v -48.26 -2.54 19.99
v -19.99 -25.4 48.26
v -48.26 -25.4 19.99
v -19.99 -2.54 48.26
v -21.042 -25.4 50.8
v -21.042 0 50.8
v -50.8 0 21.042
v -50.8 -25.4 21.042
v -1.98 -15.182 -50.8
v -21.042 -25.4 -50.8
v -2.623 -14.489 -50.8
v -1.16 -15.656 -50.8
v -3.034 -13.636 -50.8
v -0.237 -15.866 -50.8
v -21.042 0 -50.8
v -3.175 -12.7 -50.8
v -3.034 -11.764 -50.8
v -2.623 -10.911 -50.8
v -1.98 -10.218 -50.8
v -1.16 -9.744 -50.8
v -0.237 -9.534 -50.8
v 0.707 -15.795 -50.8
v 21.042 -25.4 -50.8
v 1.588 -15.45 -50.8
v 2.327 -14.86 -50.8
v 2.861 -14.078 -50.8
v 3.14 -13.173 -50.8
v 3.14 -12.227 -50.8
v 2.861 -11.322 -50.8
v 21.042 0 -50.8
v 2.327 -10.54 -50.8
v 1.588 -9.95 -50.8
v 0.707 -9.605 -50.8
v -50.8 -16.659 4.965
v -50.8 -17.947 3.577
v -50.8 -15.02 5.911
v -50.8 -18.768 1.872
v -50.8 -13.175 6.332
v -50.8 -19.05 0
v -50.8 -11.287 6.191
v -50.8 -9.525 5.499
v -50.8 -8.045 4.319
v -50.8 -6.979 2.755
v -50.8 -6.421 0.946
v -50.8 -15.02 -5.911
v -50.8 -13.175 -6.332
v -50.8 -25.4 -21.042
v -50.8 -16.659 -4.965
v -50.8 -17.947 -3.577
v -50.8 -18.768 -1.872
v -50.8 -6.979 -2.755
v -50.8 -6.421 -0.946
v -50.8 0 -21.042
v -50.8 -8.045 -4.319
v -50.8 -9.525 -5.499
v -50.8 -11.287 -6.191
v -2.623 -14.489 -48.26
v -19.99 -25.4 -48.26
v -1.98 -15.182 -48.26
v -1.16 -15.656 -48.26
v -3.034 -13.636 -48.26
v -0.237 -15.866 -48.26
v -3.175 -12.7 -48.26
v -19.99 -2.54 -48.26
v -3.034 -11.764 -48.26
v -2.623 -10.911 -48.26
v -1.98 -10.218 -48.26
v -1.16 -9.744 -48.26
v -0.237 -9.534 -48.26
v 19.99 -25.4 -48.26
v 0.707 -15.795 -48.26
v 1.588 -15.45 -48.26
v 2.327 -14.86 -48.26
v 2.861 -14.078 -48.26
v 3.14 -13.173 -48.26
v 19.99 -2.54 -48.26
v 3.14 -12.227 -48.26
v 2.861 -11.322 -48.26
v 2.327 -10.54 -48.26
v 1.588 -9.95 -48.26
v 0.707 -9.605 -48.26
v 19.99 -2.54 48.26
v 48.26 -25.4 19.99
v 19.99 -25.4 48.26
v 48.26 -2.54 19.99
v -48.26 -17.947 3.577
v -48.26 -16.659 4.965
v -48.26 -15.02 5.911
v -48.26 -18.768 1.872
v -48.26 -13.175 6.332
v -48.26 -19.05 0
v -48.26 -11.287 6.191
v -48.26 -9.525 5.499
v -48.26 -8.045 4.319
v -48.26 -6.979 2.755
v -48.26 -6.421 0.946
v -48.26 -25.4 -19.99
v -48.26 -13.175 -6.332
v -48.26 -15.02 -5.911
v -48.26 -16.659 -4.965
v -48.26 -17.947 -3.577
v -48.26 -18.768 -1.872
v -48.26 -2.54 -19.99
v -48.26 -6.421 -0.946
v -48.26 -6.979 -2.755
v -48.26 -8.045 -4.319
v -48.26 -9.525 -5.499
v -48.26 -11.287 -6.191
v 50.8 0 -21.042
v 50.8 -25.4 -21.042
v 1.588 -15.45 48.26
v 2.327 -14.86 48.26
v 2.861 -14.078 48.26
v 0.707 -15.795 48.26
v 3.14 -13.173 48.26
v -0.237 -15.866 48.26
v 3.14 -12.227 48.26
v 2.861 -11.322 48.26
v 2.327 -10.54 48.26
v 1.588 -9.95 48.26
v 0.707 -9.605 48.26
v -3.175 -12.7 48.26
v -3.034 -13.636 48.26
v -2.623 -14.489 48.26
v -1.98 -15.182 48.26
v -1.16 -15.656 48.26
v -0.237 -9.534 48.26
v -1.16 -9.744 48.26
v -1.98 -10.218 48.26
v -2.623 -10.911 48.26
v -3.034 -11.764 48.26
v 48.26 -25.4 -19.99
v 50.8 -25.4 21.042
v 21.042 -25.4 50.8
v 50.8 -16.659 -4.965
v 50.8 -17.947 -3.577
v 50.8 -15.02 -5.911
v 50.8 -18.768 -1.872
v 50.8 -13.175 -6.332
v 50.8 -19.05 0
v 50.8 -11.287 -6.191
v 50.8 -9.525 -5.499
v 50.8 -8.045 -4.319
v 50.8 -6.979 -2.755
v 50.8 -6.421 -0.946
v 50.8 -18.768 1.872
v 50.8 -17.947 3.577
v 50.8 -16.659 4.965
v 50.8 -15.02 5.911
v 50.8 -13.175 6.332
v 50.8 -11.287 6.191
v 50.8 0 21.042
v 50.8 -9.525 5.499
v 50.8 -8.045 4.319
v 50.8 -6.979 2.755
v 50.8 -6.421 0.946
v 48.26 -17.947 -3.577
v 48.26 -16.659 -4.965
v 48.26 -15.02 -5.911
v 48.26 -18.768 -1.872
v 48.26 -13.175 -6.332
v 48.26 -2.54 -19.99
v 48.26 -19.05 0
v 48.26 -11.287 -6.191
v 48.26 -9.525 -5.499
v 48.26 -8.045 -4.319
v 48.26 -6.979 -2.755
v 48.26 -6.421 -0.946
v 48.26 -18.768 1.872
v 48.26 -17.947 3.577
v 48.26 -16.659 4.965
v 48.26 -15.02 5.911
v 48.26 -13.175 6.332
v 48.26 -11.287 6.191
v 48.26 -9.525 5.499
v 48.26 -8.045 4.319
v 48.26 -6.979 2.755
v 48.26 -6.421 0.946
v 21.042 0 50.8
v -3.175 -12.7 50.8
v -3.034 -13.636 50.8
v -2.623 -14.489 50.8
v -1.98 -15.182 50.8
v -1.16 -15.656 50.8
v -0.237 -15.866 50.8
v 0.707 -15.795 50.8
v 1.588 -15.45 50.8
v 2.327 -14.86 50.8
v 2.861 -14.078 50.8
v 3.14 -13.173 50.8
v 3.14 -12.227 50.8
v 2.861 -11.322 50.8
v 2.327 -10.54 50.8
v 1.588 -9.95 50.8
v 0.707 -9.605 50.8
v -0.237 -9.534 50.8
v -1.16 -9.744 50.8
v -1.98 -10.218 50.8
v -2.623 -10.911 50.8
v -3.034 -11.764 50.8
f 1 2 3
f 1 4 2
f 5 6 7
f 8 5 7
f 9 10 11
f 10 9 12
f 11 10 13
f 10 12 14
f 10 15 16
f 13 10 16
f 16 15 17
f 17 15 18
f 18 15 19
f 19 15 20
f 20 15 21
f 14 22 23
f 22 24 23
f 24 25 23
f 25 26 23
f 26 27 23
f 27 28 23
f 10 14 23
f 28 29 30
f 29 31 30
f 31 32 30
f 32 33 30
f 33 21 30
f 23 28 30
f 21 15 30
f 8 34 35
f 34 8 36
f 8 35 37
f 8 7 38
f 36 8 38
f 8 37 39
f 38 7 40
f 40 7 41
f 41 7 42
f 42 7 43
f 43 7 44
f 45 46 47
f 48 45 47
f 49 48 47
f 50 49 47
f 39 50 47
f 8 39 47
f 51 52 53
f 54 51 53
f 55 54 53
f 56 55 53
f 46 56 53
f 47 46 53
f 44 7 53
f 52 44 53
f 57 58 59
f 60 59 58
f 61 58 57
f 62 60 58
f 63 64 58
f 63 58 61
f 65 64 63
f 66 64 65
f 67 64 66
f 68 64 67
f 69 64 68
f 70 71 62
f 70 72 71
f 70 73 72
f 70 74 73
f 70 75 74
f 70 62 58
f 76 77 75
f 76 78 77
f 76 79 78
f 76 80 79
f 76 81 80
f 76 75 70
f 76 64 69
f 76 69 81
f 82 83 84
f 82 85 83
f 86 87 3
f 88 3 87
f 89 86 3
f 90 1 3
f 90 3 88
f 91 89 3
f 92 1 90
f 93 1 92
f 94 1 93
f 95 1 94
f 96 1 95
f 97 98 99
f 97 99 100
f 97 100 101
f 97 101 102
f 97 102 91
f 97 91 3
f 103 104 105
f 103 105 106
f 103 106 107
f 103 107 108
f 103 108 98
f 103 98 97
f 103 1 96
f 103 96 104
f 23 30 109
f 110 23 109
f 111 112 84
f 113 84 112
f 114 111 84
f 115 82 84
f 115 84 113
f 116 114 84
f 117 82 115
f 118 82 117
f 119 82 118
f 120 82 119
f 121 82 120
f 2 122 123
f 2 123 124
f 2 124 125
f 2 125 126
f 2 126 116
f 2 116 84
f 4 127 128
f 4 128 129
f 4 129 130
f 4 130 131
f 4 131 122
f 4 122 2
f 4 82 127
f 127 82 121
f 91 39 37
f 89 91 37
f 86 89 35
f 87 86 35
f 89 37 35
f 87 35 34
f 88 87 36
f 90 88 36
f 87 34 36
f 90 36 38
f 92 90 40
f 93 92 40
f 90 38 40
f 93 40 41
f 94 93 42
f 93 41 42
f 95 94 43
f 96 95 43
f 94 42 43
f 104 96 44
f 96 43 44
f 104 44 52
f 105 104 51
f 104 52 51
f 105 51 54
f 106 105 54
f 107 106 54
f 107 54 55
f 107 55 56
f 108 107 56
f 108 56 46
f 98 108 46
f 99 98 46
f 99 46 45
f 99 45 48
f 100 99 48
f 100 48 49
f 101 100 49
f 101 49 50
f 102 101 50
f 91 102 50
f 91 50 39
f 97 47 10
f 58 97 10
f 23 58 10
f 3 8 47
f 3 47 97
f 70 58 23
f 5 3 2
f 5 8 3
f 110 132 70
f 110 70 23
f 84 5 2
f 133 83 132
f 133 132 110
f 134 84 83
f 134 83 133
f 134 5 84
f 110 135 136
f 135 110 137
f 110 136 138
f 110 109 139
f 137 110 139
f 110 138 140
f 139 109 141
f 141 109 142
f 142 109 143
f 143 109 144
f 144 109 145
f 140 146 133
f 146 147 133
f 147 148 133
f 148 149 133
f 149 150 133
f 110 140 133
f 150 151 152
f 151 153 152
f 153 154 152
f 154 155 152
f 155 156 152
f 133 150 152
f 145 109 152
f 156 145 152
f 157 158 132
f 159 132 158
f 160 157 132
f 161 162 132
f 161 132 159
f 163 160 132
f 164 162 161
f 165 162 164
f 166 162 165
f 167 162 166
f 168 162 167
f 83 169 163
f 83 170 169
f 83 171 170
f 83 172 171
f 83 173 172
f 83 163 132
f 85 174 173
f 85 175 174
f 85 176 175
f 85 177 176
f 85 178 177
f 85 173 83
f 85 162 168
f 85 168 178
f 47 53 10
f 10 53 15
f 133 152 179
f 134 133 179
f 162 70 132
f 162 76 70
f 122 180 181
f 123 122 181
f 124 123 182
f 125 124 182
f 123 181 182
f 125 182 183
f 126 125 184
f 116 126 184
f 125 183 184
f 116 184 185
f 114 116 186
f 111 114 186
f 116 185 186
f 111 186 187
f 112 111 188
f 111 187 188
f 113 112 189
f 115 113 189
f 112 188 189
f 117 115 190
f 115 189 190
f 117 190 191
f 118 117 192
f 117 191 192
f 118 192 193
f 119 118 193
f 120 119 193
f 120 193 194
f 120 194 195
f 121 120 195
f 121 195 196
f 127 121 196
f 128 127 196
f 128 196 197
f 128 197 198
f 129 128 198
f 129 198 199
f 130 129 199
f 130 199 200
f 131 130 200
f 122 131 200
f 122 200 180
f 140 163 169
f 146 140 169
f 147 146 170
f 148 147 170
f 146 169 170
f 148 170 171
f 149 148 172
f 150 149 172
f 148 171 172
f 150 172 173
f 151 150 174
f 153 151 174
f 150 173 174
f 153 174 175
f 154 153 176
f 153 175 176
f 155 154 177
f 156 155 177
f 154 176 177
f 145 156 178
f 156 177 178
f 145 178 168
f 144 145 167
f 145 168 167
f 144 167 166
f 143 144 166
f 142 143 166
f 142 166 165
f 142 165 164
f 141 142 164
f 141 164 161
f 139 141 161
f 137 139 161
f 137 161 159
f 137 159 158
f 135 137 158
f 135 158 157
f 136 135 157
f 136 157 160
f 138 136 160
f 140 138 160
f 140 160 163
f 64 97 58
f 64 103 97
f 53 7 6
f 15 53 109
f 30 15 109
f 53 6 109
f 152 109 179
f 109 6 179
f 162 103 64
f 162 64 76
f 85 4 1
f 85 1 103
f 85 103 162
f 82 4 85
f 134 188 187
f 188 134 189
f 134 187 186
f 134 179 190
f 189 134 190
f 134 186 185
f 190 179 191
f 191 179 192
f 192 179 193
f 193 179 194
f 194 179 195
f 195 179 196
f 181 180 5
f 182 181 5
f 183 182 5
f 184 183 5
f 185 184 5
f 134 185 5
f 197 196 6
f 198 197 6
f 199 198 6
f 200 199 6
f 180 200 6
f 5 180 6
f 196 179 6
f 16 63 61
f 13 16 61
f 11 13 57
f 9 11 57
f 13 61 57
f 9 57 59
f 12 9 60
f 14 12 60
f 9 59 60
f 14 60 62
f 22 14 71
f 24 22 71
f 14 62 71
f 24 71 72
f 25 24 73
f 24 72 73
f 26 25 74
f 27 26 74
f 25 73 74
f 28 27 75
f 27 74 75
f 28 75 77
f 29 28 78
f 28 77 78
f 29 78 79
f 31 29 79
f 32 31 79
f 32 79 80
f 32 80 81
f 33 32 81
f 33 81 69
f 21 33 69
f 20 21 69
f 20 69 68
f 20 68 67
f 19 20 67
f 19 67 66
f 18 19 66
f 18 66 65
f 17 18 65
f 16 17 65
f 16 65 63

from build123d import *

# Parameters (mm, degrees)
F1_DEPTH = 25.4
F2_T     = -2.54
F4_D     = 6.35
F6_D     = 12.7


with BuildPart() as f1:
    # F0 (on Front) → F1 (new body)
    with BuildSketch(Plane.XZ):
        Polygon((50.8, -21.042049), (50.8, 21.042049), (21.042049, 50.8), (-21.042049, 50.8), (-21.042049, -50.8), (0, -50.8), (21.042049, -50.8), align=None)
        Polygon((-21.042049, -50.8), (-21.042049, 50.8), (-50.8, 21.042049), (-50.8, -21.042049), align=None)
    extrude(amount=F1_DEPTH)

    # F2
    f2_openings = [f1.faces().sort_by_distance(p)[0] for p in [
        (0, -25.4, 0),
    ]]
    offset(amount=F2_T, openings=f2_openings)

    # F4 (through all)
    with Locations(Plane(origin=(0, 0, -50.8), x_dir=(1, 0, 0), z_dir=(0, 0, -1))):
        with Locations((0, 12.7)):
            Hole(F4_D / 2)

    # F6 (through all)
    with Locations(Plane.YZ.offset(50.8)):
        with Locations((-12.7, 0)):
            Hole(F6_D / 2)


solid = f1.part
